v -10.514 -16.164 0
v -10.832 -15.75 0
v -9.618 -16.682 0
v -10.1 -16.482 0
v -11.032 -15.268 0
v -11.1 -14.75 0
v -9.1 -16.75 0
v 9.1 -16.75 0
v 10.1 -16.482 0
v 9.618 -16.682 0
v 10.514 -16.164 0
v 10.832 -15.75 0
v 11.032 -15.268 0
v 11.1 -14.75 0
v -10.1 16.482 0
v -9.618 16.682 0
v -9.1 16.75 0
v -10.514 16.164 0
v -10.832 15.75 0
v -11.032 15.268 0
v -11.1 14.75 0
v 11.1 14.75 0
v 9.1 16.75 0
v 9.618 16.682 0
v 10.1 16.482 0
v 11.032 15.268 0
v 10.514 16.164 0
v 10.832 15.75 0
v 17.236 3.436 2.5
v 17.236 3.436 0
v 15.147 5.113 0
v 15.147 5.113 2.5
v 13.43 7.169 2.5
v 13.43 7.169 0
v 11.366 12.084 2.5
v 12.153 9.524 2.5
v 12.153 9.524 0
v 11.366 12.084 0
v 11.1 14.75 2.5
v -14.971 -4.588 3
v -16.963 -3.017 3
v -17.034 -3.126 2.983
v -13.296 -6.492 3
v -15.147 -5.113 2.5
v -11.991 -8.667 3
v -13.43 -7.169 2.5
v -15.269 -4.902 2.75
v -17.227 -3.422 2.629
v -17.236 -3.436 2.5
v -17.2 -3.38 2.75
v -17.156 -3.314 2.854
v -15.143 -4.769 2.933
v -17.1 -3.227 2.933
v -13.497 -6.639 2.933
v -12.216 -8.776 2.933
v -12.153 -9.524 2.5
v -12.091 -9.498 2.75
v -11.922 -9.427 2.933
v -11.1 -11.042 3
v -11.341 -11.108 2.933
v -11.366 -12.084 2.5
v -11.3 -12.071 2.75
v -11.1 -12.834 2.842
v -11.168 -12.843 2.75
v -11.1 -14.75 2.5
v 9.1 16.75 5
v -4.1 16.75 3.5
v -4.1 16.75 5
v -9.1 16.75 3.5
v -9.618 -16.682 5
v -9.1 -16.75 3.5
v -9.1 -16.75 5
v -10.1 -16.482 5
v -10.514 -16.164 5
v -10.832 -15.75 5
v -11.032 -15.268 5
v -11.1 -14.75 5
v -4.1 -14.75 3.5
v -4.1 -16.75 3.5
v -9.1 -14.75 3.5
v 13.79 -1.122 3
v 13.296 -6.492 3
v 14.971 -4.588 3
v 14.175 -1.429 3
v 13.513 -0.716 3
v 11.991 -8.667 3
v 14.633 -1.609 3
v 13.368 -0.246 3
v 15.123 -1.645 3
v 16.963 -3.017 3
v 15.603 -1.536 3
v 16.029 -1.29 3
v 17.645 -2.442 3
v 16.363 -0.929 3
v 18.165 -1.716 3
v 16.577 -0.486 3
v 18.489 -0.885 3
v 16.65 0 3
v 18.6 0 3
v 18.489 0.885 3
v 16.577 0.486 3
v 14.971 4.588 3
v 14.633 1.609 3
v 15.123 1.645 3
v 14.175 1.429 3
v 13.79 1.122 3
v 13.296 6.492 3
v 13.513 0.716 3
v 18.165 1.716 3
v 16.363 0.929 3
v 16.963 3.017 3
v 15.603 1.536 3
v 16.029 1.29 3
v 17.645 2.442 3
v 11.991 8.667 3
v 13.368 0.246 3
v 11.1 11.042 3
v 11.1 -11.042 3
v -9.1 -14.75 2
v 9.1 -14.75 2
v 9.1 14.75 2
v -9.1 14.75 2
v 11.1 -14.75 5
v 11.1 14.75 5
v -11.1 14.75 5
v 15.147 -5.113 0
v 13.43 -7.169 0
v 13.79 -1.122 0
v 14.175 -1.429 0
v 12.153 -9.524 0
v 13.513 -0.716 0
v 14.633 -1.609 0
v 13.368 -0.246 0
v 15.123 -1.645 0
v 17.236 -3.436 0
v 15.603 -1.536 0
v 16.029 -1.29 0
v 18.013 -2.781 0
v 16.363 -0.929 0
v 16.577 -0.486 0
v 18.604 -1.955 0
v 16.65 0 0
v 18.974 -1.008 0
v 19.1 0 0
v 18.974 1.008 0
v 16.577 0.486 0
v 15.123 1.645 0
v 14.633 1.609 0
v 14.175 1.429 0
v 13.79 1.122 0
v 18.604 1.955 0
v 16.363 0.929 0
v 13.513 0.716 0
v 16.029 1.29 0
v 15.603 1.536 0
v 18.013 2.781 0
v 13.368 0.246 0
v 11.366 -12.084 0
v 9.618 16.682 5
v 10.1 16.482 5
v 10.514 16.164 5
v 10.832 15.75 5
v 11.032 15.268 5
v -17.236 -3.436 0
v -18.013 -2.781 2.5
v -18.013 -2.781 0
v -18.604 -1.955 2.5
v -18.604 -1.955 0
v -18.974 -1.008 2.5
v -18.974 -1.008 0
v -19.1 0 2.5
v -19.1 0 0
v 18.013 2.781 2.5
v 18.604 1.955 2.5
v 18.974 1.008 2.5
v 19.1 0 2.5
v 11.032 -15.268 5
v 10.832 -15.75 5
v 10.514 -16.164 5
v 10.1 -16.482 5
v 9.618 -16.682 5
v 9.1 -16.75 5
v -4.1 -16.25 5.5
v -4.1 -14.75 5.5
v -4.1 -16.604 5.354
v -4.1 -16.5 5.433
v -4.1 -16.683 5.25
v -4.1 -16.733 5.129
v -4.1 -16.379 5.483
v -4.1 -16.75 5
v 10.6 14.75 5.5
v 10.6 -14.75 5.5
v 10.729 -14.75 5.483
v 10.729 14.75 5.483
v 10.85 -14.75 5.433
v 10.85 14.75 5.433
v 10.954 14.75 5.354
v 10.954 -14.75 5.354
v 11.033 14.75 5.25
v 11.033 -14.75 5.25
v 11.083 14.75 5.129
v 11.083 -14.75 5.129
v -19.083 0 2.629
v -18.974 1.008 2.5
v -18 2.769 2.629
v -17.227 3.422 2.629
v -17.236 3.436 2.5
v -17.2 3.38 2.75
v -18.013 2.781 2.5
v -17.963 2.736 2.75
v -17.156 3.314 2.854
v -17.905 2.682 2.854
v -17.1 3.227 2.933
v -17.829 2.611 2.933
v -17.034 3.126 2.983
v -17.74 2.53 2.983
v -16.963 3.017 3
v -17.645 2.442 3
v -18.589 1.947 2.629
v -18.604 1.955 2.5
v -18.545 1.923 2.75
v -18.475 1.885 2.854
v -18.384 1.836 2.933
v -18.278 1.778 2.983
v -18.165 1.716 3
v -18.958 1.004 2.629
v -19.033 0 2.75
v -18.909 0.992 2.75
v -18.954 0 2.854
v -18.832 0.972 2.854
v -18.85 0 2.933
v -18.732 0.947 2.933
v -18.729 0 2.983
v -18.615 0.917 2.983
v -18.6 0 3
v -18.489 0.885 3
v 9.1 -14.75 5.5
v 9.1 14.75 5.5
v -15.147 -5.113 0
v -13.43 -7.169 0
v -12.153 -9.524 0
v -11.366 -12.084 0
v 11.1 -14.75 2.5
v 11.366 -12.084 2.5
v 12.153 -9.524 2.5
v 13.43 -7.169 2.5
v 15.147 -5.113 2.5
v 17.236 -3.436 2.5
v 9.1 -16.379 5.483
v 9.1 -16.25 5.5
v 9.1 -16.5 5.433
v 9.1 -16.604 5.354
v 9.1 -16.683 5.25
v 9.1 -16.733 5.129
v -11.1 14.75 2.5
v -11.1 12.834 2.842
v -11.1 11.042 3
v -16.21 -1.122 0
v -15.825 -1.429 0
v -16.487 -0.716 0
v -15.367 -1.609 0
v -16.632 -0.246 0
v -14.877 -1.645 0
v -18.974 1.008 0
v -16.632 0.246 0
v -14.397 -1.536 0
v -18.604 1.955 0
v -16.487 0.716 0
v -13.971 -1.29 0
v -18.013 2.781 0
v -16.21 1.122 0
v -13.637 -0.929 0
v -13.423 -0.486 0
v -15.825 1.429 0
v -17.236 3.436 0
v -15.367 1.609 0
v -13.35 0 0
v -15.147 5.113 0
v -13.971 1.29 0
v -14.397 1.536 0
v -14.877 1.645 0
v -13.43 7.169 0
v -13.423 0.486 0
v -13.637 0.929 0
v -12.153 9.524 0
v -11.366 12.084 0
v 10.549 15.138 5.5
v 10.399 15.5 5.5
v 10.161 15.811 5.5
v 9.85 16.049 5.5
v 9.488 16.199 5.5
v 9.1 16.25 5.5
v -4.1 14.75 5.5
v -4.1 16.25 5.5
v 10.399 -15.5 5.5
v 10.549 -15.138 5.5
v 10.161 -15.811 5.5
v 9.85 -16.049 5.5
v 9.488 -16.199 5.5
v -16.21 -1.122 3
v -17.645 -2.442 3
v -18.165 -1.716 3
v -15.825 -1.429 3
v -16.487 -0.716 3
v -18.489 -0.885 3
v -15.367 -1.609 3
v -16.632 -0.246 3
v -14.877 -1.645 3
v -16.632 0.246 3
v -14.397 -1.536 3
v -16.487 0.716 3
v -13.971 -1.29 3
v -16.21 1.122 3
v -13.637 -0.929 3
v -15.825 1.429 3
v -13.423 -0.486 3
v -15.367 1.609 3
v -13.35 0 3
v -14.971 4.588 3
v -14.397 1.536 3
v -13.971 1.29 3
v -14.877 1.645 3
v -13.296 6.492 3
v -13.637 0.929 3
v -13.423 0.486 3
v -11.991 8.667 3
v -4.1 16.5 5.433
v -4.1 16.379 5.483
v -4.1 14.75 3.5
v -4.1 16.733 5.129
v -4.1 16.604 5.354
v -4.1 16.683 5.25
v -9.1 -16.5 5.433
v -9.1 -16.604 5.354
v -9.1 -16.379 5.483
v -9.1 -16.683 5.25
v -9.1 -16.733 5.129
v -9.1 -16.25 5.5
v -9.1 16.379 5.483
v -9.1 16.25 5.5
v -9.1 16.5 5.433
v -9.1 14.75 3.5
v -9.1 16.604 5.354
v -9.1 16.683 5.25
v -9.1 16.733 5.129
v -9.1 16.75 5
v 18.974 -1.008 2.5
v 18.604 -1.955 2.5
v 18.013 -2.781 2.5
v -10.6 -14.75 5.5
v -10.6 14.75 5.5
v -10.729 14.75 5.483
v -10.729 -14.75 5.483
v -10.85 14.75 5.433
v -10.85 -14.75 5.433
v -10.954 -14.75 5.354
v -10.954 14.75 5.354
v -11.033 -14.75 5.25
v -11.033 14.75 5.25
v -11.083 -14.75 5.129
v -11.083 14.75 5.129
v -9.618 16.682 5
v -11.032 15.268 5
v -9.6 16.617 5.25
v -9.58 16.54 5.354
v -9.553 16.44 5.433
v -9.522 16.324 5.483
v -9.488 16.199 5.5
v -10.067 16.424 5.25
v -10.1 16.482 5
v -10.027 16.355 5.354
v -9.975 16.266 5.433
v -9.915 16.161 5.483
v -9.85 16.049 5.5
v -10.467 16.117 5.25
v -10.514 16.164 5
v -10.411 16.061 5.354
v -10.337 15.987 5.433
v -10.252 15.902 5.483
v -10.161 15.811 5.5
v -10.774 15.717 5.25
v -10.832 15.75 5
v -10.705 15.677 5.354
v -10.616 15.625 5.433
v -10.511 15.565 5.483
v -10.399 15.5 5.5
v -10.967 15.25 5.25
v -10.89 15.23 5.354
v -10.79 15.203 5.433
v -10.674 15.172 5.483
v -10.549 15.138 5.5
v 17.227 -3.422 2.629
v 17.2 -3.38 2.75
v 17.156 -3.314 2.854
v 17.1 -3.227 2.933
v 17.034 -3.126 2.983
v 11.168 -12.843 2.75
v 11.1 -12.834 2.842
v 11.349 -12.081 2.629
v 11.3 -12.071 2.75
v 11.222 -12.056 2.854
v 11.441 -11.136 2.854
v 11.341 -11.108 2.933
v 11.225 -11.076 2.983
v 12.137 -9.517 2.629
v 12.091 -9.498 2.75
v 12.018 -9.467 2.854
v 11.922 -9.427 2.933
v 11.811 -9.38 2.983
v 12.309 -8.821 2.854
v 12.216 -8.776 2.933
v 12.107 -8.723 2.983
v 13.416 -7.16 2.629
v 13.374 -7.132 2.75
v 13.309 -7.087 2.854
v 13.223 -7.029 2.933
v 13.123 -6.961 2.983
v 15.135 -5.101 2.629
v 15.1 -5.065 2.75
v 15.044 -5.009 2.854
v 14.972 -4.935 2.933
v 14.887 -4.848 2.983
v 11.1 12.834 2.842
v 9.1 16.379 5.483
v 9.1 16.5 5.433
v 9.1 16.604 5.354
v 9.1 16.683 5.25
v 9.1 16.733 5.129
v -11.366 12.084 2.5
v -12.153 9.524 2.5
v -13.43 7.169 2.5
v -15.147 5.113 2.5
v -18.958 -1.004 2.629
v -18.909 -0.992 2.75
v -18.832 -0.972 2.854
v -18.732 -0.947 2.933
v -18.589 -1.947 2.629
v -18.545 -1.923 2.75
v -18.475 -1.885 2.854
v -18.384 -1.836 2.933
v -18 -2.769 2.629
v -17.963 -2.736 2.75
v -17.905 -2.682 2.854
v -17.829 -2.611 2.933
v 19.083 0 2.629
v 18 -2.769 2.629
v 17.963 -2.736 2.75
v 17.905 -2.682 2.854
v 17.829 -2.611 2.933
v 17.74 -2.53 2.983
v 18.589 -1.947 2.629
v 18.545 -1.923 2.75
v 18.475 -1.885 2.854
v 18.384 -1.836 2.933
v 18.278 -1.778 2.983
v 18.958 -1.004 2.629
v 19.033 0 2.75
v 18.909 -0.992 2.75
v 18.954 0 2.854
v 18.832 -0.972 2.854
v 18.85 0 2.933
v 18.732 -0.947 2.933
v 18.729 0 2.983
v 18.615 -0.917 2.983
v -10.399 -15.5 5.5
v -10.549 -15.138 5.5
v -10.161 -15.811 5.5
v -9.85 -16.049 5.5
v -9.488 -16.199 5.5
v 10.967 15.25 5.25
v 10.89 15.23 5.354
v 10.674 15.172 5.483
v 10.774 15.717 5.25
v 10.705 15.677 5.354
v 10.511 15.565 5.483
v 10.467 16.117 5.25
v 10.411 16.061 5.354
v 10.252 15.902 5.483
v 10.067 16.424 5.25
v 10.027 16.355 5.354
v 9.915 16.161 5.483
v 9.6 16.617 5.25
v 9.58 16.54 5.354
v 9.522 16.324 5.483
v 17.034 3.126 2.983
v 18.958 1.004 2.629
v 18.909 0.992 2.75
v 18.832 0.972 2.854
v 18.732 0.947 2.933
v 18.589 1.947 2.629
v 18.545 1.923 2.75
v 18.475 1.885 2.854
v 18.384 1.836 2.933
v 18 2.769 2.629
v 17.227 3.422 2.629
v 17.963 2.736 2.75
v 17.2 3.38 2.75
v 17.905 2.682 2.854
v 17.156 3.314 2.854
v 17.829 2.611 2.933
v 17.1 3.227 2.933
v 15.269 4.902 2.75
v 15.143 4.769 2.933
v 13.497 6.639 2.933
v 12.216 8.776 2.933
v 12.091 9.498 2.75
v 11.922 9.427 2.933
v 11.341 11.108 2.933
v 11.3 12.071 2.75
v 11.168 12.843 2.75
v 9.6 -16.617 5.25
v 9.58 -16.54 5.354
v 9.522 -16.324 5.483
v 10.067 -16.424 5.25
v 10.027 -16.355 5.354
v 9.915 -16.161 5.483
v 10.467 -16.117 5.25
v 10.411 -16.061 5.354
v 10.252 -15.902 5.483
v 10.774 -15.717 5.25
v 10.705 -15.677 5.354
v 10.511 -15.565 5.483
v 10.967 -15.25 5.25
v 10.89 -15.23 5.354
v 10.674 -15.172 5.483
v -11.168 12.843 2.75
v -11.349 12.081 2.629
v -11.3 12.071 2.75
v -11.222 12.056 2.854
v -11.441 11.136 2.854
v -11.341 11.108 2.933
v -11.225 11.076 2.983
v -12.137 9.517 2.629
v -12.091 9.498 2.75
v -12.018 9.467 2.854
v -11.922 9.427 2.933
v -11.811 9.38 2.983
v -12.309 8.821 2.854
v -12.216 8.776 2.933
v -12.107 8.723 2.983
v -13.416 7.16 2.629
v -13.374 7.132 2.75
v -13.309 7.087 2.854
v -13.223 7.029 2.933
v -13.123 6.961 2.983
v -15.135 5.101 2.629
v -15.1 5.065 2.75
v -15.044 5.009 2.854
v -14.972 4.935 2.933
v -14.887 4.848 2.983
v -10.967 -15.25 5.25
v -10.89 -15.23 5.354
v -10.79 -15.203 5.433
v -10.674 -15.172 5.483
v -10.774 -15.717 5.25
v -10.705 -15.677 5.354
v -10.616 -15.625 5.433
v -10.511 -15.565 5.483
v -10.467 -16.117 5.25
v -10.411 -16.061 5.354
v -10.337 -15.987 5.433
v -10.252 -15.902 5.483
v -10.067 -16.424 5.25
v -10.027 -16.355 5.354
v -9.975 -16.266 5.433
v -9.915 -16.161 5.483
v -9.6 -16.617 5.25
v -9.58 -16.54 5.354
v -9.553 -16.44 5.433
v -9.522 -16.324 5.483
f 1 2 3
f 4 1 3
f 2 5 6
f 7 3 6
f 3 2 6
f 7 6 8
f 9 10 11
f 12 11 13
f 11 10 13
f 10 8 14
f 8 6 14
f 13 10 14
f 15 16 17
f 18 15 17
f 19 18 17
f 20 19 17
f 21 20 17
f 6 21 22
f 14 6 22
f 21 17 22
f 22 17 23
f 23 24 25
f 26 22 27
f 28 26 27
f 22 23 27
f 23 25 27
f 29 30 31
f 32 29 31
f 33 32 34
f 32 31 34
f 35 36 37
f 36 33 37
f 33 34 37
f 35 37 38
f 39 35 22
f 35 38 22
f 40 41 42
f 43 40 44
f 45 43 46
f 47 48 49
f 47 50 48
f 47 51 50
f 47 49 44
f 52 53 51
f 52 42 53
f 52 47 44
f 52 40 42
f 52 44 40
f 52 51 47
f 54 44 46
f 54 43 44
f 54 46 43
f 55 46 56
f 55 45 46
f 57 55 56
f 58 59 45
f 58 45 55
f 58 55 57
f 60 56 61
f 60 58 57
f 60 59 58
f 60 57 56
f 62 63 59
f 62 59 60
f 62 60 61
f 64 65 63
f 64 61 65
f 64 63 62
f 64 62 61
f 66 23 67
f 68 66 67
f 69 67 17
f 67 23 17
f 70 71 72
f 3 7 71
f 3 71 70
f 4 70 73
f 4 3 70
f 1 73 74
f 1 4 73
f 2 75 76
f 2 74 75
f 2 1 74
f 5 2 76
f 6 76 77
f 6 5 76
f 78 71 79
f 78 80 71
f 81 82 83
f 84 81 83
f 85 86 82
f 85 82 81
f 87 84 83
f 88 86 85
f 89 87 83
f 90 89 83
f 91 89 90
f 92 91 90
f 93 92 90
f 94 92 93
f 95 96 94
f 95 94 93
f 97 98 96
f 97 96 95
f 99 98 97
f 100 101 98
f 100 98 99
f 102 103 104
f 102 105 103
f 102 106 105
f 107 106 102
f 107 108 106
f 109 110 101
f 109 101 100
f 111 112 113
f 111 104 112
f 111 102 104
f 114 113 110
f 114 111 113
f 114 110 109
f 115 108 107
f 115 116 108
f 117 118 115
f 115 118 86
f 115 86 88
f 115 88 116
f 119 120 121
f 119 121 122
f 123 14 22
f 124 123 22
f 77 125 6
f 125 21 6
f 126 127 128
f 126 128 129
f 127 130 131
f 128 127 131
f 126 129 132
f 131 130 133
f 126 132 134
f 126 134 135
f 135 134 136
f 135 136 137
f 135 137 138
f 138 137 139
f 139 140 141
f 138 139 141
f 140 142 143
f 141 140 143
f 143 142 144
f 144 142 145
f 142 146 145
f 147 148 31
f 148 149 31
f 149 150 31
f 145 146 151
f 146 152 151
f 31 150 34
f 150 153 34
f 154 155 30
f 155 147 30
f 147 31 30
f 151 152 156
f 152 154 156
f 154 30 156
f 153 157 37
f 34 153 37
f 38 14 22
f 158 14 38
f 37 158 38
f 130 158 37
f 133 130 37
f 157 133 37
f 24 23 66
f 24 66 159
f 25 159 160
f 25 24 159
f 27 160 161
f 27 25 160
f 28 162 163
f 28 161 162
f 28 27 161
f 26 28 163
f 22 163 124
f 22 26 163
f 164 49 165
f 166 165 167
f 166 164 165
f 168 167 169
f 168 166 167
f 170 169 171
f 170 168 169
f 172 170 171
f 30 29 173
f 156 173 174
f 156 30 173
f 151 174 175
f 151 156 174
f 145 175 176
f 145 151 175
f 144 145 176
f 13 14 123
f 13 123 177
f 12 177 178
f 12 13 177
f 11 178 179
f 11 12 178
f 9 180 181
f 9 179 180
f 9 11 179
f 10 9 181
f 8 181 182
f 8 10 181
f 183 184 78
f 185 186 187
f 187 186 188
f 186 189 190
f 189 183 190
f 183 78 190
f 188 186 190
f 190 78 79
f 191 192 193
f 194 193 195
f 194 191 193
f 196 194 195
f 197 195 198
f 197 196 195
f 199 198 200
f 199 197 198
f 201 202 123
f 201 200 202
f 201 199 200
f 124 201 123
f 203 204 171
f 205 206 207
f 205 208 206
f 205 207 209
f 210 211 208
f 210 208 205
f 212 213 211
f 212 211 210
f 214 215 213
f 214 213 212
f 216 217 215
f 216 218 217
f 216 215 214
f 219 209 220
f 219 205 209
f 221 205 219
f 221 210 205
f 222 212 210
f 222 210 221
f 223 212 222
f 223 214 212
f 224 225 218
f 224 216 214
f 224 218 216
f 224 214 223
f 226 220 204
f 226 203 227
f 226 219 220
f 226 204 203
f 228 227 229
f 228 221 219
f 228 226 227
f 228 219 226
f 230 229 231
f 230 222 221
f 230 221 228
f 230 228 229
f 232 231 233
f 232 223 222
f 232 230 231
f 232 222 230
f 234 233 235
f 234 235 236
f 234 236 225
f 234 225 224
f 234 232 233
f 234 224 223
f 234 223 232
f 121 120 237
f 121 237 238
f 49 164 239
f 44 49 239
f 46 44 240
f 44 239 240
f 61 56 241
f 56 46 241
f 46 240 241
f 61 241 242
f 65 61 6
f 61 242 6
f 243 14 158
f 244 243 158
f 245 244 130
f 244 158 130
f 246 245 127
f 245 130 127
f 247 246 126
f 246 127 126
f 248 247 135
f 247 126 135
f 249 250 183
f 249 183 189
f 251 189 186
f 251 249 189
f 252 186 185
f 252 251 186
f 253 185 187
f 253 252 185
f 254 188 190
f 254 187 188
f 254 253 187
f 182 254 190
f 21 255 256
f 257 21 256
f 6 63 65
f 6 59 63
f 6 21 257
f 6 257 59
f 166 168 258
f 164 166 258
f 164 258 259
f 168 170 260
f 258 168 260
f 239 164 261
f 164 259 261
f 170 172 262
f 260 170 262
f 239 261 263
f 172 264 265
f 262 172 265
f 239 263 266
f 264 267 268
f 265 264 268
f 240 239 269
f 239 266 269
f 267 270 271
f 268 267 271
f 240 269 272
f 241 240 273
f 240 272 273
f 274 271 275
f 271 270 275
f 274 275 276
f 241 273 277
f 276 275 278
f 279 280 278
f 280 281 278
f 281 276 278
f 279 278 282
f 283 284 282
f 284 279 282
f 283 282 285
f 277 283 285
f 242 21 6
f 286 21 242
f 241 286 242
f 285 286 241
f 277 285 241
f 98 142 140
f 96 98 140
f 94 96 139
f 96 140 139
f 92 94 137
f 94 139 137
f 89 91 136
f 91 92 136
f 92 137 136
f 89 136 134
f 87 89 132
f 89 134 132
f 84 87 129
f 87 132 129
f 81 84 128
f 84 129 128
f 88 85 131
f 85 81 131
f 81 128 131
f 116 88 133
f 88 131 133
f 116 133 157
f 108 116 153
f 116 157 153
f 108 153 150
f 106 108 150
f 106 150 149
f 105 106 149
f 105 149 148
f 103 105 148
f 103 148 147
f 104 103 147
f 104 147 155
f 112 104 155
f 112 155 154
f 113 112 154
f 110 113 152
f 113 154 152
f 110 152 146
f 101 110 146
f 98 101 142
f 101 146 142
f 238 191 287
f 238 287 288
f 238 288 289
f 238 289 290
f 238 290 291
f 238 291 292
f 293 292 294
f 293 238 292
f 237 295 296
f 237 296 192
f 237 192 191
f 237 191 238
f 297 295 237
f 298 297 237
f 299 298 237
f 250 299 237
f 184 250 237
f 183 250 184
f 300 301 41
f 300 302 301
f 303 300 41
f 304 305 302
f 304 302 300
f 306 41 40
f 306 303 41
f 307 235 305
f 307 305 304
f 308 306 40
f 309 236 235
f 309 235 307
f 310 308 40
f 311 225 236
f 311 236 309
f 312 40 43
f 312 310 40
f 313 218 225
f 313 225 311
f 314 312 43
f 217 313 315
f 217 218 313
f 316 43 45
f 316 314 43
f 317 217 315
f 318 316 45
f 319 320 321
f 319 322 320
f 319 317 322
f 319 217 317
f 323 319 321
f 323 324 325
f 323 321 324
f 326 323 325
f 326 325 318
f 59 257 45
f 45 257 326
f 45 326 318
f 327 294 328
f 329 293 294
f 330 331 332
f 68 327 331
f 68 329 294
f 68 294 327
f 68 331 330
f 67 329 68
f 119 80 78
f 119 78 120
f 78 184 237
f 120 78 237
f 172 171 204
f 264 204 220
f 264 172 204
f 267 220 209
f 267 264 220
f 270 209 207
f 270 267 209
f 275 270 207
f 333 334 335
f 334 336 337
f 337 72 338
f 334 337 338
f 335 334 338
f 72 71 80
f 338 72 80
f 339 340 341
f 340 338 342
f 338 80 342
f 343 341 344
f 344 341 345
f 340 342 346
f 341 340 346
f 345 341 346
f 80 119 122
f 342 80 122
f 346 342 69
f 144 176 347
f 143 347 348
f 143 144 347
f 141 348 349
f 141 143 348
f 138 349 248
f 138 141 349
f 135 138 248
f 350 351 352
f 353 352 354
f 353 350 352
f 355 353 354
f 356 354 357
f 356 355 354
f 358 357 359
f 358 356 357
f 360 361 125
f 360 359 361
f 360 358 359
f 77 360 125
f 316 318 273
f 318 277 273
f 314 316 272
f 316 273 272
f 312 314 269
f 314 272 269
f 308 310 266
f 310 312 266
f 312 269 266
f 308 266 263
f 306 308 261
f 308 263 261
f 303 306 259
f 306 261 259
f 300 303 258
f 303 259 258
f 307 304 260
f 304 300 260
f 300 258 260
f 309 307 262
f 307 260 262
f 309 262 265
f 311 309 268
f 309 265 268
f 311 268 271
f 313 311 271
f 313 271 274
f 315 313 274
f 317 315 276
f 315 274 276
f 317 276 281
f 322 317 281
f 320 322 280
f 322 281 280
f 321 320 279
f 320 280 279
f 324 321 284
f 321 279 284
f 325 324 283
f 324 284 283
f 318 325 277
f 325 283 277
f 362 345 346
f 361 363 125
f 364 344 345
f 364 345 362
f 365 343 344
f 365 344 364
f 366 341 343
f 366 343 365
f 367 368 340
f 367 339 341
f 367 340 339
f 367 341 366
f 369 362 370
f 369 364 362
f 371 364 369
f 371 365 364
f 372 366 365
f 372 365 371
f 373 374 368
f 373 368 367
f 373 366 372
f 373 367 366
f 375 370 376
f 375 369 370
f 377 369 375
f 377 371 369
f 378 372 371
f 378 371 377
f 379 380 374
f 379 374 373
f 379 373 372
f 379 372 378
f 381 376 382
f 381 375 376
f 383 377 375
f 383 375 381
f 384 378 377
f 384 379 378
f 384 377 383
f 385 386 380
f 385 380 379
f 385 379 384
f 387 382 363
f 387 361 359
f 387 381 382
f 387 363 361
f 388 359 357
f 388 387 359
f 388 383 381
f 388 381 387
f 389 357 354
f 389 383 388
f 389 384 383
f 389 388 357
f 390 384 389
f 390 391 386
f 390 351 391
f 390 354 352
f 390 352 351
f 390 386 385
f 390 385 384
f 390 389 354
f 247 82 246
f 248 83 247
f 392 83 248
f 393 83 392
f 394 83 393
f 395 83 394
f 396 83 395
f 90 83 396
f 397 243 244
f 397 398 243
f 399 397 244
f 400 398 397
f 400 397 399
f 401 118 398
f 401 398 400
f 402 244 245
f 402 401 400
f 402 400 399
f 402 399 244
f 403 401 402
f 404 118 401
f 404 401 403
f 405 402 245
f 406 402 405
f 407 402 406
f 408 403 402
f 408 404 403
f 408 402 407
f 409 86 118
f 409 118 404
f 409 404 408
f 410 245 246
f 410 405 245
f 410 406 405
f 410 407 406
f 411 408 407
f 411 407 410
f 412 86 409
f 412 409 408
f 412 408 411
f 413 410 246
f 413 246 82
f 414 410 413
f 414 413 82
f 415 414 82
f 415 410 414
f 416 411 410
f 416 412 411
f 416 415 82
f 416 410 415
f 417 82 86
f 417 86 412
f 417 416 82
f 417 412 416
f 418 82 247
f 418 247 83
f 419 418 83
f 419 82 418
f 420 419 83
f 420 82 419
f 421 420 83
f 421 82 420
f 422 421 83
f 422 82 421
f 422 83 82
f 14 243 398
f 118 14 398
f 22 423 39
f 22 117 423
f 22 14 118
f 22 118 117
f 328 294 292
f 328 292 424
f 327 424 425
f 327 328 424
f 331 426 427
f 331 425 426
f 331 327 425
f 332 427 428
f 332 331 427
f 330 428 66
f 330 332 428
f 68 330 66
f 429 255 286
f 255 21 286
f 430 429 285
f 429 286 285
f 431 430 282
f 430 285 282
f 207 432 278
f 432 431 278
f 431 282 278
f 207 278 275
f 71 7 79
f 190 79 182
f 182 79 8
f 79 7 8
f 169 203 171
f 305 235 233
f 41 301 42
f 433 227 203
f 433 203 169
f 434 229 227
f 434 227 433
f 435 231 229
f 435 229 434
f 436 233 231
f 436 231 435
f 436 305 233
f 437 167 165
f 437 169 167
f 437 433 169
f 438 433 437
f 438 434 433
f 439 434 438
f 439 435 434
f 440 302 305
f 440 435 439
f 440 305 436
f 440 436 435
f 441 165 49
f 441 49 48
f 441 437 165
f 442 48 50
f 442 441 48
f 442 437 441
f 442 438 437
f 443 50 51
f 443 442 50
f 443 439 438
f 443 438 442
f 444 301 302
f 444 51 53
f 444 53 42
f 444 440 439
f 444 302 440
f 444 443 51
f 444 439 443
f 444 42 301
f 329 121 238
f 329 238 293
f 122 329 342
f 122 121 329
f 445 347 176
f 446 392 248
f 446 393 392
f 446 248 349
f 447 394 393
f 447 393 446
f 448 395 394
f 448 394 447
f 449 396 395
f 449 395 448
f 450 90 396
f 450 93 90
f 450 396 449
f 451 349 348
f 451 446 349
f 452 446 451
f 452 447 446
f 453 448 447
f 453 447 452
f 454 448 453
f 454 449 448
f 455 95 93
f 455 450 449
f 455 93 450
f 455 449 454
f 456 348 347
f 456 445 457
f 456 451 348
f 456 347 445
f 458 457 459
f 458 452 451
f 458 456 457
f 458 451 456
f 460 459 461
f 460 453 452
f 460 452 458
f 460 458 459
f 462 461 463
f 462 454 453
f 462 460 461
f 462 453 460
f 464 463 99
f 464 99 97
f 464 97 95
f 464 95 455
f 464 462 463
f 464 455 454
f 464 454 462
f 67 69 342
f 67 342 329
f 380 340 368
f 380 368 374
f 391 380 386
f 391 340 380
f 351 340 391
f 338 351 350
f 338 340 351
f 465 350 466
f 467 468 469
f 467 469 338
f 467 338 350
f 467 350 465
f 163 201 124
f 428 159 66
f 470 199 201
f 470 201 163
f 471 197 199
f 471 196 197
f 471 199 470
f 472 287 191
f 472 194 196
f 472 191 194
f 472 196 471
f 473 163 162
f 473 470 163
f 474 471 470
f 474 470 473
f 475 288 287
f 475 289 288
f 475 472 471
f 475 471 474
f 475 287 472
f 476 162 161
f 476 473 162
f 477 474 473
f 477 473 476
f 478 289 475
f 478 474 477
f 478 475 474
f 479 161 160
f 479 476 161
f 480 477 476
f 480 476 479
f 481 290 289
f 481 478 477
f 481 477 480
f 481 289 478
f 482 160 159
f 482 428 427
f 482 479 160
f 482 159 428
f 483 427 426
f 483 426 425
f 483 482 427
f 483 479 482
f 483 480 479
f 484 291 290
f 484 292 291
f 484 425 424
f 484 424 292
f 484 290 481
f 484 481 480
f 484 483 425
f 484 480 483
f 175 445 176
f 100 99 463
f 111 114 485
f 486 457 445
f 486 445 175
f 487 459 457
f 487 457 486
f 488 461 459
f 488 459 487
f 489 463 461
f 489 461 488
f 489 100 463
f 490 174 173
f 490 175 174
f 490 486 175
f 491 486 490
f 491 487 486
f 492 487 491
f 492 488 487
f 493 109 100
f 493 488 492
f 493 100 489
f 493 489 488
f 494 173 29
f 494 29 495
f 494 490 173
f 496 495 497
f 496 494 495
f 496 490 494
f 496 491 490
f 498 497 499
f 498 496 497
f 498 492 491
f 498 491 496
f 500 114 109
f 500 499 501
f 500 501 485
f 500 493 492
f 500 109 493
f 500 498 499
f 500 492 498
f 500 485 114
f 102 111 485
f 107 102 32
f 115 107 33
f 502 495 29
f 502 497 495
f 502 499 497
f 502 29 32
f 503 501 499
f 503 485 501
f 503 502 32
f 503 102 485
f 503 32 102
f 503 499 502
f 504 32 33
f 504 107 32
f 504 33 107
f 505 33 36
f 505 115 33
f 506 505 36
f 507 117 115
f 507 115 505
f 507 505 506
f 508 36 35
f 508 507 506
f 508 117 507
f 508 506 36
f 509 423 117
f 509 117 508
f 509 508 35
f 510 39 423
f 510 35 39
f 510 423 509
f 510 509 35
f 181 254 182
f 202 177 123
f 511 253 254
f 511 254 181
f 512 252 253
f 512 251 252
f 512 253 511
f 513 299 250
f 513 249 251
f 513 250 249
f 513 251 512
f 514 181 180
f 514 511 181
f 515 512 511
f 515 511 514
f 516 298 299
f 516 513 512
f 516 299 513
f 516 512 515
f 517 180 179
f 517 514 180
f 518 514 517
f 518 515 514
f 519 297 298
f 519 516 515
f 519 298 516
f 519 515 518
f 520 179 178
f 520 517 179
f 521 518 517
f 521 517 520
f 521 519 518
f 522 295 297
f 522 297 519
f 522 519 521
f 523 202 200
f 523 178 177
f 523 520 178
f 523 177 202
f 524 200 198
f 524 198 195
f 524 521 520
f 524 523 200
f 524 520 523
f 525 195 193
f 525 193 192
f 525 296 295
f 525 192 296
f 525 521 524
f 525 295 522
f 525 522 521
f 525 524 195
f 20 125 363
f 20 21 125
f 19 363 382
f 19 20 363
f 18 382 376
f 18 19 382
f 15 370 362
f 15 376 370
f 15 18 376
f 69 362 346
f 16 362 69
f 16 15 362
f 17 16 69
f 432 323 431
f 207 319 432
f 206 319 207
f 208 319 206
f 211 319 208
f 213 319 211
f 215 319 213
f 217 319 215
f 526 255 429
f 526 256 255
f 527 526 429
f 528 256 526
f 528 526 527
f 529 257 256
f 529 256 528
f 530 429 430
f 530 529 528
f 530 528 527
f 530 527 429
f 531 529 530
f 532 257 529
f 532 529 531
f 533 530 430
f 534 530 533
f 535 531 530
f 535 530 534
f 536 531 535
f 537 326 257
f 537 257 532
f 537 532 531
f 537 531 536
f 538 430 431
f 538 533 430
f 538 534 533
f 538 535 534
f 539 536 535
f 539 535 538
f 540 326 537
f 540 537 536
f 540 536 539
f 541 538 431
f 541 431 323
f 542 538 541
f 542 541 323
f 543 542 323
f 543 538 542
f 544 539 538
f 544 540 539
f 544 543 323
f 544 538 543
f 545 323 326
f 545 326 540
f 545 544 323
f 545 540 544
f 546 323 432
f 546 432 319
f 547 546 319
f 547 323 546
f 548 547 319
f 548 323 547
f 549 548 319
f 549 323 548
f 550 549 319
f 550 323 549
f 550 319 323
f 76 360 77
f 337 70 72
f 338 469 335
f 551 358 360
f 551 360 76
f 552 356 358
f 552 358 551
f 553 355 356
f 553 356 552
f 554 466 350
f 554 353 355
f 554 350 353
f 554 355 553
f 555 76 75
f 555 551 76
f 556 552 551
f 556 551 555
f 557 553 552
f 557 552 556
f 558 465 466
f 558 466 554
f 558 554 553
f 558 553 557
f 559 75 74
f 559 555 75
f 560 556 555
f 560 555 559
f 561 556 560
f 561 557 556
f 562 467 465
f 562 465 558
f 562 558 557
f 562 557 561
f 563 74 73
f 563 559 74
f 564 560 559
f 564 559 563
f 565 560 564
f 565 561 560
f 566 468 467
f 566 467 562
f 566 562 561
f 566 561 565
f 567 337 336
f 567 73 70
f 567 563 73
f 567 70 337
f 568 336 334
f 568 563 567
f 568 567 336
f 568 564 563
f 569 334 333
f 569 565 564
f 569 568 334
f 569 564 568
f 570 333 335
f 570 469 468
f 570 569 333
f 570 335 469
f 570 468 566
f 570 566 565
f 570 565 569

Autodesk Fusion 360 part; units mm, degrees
sketch "草图1" plane through (0, 0, 0) normal (0, 0, 1) x (1, 0, 0)
  line L0 (8.85, 14.5) -> (-8.85, 14.5) construction
  line L1 (-8.85, 14.5) -> (-8.85, -14.5) construction
  line L2 (-8.85, -14.5) -> (8.85, -14.5) construction
  line L3 (8.85, -14.5) -> (8.85, 14.5) construction
  line L4 (8.85, 14.5) -> (-8.85, -14.5) construction
  line L5 (-8.85, 14.5) -> (8.85, -14.5) construction
  line L6 (9.1, 14.75) -> (-9.1, 14.75)
  line L7 (-9.1, 14.75) -> (-9.1, -14.75)
  line L8 (-9.1, -14.75) -> (9.1, -14.75)
  line L9 (9.1, -14.75) -> (9.1, 14.75)
  line L10 (9.1, 14.75) -> (-9.1, -14.75) construction
  line L11 (-9.1, 14.75) -> (9.1, -14.75) construction
  line L12 (-9.1, -16.75) -> (9.1, -16.75)
  line L13 (11.1, -14.75) -> (11.1, 14.75)
  line L14 (9.1, 16.75) -> (-9.1, 16.75)
  line L15 (-11.1, 14.75) -> (-11.1, -14.75)
  arc A0 (-9.1, 16.75) -> (-11.1, 14.75) centre (-9.1, 14.75) ccw
  arc A1 (11.1, 14.75) -> (9.1, 16.75) centre (9.1, 14.75) ccw
  arc A2 (9.1, -16.75) -> (11.1, -14.75) centre (9.1, -14.75) ccw
  arc A3 (-11.1, -14.75) -> (-9.1, -16.75) centre (-9.1, -14.75) ccw
  circle A4 centre (15, 0) radius 1.65
  line L16 (0, 0) -> (0, 9) construction
  circle A5 centre (-15, 0) radius 1.65
  line L17 (19.1, 4.3337) -> (19.1, -4) construction
  circle A6 centre (15, 0) radius 4.1 construction
  arc A7 (11.1, 14.75) -> (17.2361, 3.4365) centre (24.5977, 14.75) ccw
  arc A8 (19.1, 0) -> (17.2361, 3.4365) centre (15, 0) ccw
  line L18 (0, 0) -> (27.1496, 0) construction
  arc A9 (17.2361, -3.4365) -> (11.1, -14.75) centre (24.5977, -14.75) ccw
  arc A10 (17.2361, -3.4365) -> (19.1, 0) centre (15, 0) ccw
  arc A11 (-17.2361, 3.4365) -> (-11.1, 14.75) centre (-24.5977, 14.75) ccw
  arc A12 (-17.2361, 3.4365) -> (-19.1, 0) centre (-15, 0) ccw
  arc A13 (-19.1, 0) -> (-17.2361, -3.4365) centre (-15, 0) ccw
  arc A14 (-11.1, -14.75) -> (-17.2361, -3.4365) centre (-24.5977, -14.75) ccw
  dimension "d1" = 17.7
  dimension "d2" = 29
  dimension "d3" = 18.2
  dimension "d4" = 29.5
  dimension "d8" = 2
  dimension "d17" = 3.3
  dimension "d18" = 15
  dimension "d19" = 8
extrude "拉伸1" add sketch "草图1" along normal blind 3.5 contours L6 L7 L8 L9 | L12 L13 L14 L15 A0 A1 A2 A3 makes body 1
sketch "草图2" plane through (0, 0, 3.5) normal (0, 0, 1) x (-1, 0, 0)
  line L0 (11.1, -14.75) -> (11.1, 14.75)
  line L1 (9.1, 16.75) -> (-9.1, 16.75)
  line L2 (-11.1, 14.75) -> (-11.1, -14.75)
  line L3 (-9.1, -16.75) -> (9.1, -16.75)
  arc A0 (11.1, 14.75) -> (9.1, 16.75) centre (9.1, 14.75) ccw
  arc A1 (-9.1, 16.75) -> (-11.1, 14.75) centre (-9.1, 14.75) ccw
  arc A2 (-11.1, -14.75) -> (-9.1, -16.75) centre (-9.1, -14.75) ccw
  arc A3 (9.1, -16.75) -> (11.1, -14.75) centre (9.1, -14.75) ccw
  line L4 (-9.1, -14.75) -> (9.1, -14.75)
  line L5 (9.1, -14.75) -> (9.1, 14.75)
  line L6 (9.1, 14.75) -> (-9.1, 14.75)
  line L7 (-9.1, 14.75) -> (-9.1, -14.75)
  line L8 (-9.1, -14.75) -> (9.1, 14.75) construction
  line L9 (9.1, -14.75) -> (-9.1, 14.75) construction
  line L10 (9.1, -14.75) -> (9.1, -16.75)
  line L11 (4.1, -14.75) -> (4.1, -16.75)
  line L12 (9.1, 14.75) -> (9.1, 16.75)
  line L13 (4.1, 14.75) -> (4.1, 16.75)
  dimension "d9" = 18.2
  dimension "d10" = 29.5
  dimension "d11" = 5
  dimension "d12" = 5
extrude "拉伸2" add sketch "草图2" along normal blind 2 contours L0 A0 A3 L5 L10 L12 | L1 L2 L3 A1 A2 L4 L6 L7 L11 L13 bodies 1
extrude "拉伸3" cut sketch "草图2" against normal blind 1.5 contours L4 L5 L6 L7 bodies 1
extrude "拉伸4" add sketch "草图1" along normal blind 3 separate body contours L15 A11 A12 A13 A14 | L13 A7 A8 A9 A10 makes body 2 at (-11.1, 4.9167, 1) makes body 3 at (11.1, -4.9167, 1)
fillet "圆角1" radius 0.5 3 edges at (-12.7328, 8.3148, 3) (-19.1, 0, 3) (-12.7328, -8.3148, 3) on bodies 2
fillet "圆角2" radius 0.5 11 edges at (2.5, -16.75, 5.5) (10.5142, -16.1642, 5.5) (11.1, 0, 5.5) (10.5142, 16.1642, 5.5) (2.5, 16.75, 5.5) (-10.5142, 16.1642, 5.5) (-11.1, 0, 5.5) (-10.5142, -16.1642, 5.5) (12.7328, -8.3148, 3) (19.1, 0, 3) (12.7328, 8.3148, 3) on bodies 1 3
equation "d3 = 17.7 mm + 0.5 mm"
equation "d6 = 1.5 mm + 2 mm"
